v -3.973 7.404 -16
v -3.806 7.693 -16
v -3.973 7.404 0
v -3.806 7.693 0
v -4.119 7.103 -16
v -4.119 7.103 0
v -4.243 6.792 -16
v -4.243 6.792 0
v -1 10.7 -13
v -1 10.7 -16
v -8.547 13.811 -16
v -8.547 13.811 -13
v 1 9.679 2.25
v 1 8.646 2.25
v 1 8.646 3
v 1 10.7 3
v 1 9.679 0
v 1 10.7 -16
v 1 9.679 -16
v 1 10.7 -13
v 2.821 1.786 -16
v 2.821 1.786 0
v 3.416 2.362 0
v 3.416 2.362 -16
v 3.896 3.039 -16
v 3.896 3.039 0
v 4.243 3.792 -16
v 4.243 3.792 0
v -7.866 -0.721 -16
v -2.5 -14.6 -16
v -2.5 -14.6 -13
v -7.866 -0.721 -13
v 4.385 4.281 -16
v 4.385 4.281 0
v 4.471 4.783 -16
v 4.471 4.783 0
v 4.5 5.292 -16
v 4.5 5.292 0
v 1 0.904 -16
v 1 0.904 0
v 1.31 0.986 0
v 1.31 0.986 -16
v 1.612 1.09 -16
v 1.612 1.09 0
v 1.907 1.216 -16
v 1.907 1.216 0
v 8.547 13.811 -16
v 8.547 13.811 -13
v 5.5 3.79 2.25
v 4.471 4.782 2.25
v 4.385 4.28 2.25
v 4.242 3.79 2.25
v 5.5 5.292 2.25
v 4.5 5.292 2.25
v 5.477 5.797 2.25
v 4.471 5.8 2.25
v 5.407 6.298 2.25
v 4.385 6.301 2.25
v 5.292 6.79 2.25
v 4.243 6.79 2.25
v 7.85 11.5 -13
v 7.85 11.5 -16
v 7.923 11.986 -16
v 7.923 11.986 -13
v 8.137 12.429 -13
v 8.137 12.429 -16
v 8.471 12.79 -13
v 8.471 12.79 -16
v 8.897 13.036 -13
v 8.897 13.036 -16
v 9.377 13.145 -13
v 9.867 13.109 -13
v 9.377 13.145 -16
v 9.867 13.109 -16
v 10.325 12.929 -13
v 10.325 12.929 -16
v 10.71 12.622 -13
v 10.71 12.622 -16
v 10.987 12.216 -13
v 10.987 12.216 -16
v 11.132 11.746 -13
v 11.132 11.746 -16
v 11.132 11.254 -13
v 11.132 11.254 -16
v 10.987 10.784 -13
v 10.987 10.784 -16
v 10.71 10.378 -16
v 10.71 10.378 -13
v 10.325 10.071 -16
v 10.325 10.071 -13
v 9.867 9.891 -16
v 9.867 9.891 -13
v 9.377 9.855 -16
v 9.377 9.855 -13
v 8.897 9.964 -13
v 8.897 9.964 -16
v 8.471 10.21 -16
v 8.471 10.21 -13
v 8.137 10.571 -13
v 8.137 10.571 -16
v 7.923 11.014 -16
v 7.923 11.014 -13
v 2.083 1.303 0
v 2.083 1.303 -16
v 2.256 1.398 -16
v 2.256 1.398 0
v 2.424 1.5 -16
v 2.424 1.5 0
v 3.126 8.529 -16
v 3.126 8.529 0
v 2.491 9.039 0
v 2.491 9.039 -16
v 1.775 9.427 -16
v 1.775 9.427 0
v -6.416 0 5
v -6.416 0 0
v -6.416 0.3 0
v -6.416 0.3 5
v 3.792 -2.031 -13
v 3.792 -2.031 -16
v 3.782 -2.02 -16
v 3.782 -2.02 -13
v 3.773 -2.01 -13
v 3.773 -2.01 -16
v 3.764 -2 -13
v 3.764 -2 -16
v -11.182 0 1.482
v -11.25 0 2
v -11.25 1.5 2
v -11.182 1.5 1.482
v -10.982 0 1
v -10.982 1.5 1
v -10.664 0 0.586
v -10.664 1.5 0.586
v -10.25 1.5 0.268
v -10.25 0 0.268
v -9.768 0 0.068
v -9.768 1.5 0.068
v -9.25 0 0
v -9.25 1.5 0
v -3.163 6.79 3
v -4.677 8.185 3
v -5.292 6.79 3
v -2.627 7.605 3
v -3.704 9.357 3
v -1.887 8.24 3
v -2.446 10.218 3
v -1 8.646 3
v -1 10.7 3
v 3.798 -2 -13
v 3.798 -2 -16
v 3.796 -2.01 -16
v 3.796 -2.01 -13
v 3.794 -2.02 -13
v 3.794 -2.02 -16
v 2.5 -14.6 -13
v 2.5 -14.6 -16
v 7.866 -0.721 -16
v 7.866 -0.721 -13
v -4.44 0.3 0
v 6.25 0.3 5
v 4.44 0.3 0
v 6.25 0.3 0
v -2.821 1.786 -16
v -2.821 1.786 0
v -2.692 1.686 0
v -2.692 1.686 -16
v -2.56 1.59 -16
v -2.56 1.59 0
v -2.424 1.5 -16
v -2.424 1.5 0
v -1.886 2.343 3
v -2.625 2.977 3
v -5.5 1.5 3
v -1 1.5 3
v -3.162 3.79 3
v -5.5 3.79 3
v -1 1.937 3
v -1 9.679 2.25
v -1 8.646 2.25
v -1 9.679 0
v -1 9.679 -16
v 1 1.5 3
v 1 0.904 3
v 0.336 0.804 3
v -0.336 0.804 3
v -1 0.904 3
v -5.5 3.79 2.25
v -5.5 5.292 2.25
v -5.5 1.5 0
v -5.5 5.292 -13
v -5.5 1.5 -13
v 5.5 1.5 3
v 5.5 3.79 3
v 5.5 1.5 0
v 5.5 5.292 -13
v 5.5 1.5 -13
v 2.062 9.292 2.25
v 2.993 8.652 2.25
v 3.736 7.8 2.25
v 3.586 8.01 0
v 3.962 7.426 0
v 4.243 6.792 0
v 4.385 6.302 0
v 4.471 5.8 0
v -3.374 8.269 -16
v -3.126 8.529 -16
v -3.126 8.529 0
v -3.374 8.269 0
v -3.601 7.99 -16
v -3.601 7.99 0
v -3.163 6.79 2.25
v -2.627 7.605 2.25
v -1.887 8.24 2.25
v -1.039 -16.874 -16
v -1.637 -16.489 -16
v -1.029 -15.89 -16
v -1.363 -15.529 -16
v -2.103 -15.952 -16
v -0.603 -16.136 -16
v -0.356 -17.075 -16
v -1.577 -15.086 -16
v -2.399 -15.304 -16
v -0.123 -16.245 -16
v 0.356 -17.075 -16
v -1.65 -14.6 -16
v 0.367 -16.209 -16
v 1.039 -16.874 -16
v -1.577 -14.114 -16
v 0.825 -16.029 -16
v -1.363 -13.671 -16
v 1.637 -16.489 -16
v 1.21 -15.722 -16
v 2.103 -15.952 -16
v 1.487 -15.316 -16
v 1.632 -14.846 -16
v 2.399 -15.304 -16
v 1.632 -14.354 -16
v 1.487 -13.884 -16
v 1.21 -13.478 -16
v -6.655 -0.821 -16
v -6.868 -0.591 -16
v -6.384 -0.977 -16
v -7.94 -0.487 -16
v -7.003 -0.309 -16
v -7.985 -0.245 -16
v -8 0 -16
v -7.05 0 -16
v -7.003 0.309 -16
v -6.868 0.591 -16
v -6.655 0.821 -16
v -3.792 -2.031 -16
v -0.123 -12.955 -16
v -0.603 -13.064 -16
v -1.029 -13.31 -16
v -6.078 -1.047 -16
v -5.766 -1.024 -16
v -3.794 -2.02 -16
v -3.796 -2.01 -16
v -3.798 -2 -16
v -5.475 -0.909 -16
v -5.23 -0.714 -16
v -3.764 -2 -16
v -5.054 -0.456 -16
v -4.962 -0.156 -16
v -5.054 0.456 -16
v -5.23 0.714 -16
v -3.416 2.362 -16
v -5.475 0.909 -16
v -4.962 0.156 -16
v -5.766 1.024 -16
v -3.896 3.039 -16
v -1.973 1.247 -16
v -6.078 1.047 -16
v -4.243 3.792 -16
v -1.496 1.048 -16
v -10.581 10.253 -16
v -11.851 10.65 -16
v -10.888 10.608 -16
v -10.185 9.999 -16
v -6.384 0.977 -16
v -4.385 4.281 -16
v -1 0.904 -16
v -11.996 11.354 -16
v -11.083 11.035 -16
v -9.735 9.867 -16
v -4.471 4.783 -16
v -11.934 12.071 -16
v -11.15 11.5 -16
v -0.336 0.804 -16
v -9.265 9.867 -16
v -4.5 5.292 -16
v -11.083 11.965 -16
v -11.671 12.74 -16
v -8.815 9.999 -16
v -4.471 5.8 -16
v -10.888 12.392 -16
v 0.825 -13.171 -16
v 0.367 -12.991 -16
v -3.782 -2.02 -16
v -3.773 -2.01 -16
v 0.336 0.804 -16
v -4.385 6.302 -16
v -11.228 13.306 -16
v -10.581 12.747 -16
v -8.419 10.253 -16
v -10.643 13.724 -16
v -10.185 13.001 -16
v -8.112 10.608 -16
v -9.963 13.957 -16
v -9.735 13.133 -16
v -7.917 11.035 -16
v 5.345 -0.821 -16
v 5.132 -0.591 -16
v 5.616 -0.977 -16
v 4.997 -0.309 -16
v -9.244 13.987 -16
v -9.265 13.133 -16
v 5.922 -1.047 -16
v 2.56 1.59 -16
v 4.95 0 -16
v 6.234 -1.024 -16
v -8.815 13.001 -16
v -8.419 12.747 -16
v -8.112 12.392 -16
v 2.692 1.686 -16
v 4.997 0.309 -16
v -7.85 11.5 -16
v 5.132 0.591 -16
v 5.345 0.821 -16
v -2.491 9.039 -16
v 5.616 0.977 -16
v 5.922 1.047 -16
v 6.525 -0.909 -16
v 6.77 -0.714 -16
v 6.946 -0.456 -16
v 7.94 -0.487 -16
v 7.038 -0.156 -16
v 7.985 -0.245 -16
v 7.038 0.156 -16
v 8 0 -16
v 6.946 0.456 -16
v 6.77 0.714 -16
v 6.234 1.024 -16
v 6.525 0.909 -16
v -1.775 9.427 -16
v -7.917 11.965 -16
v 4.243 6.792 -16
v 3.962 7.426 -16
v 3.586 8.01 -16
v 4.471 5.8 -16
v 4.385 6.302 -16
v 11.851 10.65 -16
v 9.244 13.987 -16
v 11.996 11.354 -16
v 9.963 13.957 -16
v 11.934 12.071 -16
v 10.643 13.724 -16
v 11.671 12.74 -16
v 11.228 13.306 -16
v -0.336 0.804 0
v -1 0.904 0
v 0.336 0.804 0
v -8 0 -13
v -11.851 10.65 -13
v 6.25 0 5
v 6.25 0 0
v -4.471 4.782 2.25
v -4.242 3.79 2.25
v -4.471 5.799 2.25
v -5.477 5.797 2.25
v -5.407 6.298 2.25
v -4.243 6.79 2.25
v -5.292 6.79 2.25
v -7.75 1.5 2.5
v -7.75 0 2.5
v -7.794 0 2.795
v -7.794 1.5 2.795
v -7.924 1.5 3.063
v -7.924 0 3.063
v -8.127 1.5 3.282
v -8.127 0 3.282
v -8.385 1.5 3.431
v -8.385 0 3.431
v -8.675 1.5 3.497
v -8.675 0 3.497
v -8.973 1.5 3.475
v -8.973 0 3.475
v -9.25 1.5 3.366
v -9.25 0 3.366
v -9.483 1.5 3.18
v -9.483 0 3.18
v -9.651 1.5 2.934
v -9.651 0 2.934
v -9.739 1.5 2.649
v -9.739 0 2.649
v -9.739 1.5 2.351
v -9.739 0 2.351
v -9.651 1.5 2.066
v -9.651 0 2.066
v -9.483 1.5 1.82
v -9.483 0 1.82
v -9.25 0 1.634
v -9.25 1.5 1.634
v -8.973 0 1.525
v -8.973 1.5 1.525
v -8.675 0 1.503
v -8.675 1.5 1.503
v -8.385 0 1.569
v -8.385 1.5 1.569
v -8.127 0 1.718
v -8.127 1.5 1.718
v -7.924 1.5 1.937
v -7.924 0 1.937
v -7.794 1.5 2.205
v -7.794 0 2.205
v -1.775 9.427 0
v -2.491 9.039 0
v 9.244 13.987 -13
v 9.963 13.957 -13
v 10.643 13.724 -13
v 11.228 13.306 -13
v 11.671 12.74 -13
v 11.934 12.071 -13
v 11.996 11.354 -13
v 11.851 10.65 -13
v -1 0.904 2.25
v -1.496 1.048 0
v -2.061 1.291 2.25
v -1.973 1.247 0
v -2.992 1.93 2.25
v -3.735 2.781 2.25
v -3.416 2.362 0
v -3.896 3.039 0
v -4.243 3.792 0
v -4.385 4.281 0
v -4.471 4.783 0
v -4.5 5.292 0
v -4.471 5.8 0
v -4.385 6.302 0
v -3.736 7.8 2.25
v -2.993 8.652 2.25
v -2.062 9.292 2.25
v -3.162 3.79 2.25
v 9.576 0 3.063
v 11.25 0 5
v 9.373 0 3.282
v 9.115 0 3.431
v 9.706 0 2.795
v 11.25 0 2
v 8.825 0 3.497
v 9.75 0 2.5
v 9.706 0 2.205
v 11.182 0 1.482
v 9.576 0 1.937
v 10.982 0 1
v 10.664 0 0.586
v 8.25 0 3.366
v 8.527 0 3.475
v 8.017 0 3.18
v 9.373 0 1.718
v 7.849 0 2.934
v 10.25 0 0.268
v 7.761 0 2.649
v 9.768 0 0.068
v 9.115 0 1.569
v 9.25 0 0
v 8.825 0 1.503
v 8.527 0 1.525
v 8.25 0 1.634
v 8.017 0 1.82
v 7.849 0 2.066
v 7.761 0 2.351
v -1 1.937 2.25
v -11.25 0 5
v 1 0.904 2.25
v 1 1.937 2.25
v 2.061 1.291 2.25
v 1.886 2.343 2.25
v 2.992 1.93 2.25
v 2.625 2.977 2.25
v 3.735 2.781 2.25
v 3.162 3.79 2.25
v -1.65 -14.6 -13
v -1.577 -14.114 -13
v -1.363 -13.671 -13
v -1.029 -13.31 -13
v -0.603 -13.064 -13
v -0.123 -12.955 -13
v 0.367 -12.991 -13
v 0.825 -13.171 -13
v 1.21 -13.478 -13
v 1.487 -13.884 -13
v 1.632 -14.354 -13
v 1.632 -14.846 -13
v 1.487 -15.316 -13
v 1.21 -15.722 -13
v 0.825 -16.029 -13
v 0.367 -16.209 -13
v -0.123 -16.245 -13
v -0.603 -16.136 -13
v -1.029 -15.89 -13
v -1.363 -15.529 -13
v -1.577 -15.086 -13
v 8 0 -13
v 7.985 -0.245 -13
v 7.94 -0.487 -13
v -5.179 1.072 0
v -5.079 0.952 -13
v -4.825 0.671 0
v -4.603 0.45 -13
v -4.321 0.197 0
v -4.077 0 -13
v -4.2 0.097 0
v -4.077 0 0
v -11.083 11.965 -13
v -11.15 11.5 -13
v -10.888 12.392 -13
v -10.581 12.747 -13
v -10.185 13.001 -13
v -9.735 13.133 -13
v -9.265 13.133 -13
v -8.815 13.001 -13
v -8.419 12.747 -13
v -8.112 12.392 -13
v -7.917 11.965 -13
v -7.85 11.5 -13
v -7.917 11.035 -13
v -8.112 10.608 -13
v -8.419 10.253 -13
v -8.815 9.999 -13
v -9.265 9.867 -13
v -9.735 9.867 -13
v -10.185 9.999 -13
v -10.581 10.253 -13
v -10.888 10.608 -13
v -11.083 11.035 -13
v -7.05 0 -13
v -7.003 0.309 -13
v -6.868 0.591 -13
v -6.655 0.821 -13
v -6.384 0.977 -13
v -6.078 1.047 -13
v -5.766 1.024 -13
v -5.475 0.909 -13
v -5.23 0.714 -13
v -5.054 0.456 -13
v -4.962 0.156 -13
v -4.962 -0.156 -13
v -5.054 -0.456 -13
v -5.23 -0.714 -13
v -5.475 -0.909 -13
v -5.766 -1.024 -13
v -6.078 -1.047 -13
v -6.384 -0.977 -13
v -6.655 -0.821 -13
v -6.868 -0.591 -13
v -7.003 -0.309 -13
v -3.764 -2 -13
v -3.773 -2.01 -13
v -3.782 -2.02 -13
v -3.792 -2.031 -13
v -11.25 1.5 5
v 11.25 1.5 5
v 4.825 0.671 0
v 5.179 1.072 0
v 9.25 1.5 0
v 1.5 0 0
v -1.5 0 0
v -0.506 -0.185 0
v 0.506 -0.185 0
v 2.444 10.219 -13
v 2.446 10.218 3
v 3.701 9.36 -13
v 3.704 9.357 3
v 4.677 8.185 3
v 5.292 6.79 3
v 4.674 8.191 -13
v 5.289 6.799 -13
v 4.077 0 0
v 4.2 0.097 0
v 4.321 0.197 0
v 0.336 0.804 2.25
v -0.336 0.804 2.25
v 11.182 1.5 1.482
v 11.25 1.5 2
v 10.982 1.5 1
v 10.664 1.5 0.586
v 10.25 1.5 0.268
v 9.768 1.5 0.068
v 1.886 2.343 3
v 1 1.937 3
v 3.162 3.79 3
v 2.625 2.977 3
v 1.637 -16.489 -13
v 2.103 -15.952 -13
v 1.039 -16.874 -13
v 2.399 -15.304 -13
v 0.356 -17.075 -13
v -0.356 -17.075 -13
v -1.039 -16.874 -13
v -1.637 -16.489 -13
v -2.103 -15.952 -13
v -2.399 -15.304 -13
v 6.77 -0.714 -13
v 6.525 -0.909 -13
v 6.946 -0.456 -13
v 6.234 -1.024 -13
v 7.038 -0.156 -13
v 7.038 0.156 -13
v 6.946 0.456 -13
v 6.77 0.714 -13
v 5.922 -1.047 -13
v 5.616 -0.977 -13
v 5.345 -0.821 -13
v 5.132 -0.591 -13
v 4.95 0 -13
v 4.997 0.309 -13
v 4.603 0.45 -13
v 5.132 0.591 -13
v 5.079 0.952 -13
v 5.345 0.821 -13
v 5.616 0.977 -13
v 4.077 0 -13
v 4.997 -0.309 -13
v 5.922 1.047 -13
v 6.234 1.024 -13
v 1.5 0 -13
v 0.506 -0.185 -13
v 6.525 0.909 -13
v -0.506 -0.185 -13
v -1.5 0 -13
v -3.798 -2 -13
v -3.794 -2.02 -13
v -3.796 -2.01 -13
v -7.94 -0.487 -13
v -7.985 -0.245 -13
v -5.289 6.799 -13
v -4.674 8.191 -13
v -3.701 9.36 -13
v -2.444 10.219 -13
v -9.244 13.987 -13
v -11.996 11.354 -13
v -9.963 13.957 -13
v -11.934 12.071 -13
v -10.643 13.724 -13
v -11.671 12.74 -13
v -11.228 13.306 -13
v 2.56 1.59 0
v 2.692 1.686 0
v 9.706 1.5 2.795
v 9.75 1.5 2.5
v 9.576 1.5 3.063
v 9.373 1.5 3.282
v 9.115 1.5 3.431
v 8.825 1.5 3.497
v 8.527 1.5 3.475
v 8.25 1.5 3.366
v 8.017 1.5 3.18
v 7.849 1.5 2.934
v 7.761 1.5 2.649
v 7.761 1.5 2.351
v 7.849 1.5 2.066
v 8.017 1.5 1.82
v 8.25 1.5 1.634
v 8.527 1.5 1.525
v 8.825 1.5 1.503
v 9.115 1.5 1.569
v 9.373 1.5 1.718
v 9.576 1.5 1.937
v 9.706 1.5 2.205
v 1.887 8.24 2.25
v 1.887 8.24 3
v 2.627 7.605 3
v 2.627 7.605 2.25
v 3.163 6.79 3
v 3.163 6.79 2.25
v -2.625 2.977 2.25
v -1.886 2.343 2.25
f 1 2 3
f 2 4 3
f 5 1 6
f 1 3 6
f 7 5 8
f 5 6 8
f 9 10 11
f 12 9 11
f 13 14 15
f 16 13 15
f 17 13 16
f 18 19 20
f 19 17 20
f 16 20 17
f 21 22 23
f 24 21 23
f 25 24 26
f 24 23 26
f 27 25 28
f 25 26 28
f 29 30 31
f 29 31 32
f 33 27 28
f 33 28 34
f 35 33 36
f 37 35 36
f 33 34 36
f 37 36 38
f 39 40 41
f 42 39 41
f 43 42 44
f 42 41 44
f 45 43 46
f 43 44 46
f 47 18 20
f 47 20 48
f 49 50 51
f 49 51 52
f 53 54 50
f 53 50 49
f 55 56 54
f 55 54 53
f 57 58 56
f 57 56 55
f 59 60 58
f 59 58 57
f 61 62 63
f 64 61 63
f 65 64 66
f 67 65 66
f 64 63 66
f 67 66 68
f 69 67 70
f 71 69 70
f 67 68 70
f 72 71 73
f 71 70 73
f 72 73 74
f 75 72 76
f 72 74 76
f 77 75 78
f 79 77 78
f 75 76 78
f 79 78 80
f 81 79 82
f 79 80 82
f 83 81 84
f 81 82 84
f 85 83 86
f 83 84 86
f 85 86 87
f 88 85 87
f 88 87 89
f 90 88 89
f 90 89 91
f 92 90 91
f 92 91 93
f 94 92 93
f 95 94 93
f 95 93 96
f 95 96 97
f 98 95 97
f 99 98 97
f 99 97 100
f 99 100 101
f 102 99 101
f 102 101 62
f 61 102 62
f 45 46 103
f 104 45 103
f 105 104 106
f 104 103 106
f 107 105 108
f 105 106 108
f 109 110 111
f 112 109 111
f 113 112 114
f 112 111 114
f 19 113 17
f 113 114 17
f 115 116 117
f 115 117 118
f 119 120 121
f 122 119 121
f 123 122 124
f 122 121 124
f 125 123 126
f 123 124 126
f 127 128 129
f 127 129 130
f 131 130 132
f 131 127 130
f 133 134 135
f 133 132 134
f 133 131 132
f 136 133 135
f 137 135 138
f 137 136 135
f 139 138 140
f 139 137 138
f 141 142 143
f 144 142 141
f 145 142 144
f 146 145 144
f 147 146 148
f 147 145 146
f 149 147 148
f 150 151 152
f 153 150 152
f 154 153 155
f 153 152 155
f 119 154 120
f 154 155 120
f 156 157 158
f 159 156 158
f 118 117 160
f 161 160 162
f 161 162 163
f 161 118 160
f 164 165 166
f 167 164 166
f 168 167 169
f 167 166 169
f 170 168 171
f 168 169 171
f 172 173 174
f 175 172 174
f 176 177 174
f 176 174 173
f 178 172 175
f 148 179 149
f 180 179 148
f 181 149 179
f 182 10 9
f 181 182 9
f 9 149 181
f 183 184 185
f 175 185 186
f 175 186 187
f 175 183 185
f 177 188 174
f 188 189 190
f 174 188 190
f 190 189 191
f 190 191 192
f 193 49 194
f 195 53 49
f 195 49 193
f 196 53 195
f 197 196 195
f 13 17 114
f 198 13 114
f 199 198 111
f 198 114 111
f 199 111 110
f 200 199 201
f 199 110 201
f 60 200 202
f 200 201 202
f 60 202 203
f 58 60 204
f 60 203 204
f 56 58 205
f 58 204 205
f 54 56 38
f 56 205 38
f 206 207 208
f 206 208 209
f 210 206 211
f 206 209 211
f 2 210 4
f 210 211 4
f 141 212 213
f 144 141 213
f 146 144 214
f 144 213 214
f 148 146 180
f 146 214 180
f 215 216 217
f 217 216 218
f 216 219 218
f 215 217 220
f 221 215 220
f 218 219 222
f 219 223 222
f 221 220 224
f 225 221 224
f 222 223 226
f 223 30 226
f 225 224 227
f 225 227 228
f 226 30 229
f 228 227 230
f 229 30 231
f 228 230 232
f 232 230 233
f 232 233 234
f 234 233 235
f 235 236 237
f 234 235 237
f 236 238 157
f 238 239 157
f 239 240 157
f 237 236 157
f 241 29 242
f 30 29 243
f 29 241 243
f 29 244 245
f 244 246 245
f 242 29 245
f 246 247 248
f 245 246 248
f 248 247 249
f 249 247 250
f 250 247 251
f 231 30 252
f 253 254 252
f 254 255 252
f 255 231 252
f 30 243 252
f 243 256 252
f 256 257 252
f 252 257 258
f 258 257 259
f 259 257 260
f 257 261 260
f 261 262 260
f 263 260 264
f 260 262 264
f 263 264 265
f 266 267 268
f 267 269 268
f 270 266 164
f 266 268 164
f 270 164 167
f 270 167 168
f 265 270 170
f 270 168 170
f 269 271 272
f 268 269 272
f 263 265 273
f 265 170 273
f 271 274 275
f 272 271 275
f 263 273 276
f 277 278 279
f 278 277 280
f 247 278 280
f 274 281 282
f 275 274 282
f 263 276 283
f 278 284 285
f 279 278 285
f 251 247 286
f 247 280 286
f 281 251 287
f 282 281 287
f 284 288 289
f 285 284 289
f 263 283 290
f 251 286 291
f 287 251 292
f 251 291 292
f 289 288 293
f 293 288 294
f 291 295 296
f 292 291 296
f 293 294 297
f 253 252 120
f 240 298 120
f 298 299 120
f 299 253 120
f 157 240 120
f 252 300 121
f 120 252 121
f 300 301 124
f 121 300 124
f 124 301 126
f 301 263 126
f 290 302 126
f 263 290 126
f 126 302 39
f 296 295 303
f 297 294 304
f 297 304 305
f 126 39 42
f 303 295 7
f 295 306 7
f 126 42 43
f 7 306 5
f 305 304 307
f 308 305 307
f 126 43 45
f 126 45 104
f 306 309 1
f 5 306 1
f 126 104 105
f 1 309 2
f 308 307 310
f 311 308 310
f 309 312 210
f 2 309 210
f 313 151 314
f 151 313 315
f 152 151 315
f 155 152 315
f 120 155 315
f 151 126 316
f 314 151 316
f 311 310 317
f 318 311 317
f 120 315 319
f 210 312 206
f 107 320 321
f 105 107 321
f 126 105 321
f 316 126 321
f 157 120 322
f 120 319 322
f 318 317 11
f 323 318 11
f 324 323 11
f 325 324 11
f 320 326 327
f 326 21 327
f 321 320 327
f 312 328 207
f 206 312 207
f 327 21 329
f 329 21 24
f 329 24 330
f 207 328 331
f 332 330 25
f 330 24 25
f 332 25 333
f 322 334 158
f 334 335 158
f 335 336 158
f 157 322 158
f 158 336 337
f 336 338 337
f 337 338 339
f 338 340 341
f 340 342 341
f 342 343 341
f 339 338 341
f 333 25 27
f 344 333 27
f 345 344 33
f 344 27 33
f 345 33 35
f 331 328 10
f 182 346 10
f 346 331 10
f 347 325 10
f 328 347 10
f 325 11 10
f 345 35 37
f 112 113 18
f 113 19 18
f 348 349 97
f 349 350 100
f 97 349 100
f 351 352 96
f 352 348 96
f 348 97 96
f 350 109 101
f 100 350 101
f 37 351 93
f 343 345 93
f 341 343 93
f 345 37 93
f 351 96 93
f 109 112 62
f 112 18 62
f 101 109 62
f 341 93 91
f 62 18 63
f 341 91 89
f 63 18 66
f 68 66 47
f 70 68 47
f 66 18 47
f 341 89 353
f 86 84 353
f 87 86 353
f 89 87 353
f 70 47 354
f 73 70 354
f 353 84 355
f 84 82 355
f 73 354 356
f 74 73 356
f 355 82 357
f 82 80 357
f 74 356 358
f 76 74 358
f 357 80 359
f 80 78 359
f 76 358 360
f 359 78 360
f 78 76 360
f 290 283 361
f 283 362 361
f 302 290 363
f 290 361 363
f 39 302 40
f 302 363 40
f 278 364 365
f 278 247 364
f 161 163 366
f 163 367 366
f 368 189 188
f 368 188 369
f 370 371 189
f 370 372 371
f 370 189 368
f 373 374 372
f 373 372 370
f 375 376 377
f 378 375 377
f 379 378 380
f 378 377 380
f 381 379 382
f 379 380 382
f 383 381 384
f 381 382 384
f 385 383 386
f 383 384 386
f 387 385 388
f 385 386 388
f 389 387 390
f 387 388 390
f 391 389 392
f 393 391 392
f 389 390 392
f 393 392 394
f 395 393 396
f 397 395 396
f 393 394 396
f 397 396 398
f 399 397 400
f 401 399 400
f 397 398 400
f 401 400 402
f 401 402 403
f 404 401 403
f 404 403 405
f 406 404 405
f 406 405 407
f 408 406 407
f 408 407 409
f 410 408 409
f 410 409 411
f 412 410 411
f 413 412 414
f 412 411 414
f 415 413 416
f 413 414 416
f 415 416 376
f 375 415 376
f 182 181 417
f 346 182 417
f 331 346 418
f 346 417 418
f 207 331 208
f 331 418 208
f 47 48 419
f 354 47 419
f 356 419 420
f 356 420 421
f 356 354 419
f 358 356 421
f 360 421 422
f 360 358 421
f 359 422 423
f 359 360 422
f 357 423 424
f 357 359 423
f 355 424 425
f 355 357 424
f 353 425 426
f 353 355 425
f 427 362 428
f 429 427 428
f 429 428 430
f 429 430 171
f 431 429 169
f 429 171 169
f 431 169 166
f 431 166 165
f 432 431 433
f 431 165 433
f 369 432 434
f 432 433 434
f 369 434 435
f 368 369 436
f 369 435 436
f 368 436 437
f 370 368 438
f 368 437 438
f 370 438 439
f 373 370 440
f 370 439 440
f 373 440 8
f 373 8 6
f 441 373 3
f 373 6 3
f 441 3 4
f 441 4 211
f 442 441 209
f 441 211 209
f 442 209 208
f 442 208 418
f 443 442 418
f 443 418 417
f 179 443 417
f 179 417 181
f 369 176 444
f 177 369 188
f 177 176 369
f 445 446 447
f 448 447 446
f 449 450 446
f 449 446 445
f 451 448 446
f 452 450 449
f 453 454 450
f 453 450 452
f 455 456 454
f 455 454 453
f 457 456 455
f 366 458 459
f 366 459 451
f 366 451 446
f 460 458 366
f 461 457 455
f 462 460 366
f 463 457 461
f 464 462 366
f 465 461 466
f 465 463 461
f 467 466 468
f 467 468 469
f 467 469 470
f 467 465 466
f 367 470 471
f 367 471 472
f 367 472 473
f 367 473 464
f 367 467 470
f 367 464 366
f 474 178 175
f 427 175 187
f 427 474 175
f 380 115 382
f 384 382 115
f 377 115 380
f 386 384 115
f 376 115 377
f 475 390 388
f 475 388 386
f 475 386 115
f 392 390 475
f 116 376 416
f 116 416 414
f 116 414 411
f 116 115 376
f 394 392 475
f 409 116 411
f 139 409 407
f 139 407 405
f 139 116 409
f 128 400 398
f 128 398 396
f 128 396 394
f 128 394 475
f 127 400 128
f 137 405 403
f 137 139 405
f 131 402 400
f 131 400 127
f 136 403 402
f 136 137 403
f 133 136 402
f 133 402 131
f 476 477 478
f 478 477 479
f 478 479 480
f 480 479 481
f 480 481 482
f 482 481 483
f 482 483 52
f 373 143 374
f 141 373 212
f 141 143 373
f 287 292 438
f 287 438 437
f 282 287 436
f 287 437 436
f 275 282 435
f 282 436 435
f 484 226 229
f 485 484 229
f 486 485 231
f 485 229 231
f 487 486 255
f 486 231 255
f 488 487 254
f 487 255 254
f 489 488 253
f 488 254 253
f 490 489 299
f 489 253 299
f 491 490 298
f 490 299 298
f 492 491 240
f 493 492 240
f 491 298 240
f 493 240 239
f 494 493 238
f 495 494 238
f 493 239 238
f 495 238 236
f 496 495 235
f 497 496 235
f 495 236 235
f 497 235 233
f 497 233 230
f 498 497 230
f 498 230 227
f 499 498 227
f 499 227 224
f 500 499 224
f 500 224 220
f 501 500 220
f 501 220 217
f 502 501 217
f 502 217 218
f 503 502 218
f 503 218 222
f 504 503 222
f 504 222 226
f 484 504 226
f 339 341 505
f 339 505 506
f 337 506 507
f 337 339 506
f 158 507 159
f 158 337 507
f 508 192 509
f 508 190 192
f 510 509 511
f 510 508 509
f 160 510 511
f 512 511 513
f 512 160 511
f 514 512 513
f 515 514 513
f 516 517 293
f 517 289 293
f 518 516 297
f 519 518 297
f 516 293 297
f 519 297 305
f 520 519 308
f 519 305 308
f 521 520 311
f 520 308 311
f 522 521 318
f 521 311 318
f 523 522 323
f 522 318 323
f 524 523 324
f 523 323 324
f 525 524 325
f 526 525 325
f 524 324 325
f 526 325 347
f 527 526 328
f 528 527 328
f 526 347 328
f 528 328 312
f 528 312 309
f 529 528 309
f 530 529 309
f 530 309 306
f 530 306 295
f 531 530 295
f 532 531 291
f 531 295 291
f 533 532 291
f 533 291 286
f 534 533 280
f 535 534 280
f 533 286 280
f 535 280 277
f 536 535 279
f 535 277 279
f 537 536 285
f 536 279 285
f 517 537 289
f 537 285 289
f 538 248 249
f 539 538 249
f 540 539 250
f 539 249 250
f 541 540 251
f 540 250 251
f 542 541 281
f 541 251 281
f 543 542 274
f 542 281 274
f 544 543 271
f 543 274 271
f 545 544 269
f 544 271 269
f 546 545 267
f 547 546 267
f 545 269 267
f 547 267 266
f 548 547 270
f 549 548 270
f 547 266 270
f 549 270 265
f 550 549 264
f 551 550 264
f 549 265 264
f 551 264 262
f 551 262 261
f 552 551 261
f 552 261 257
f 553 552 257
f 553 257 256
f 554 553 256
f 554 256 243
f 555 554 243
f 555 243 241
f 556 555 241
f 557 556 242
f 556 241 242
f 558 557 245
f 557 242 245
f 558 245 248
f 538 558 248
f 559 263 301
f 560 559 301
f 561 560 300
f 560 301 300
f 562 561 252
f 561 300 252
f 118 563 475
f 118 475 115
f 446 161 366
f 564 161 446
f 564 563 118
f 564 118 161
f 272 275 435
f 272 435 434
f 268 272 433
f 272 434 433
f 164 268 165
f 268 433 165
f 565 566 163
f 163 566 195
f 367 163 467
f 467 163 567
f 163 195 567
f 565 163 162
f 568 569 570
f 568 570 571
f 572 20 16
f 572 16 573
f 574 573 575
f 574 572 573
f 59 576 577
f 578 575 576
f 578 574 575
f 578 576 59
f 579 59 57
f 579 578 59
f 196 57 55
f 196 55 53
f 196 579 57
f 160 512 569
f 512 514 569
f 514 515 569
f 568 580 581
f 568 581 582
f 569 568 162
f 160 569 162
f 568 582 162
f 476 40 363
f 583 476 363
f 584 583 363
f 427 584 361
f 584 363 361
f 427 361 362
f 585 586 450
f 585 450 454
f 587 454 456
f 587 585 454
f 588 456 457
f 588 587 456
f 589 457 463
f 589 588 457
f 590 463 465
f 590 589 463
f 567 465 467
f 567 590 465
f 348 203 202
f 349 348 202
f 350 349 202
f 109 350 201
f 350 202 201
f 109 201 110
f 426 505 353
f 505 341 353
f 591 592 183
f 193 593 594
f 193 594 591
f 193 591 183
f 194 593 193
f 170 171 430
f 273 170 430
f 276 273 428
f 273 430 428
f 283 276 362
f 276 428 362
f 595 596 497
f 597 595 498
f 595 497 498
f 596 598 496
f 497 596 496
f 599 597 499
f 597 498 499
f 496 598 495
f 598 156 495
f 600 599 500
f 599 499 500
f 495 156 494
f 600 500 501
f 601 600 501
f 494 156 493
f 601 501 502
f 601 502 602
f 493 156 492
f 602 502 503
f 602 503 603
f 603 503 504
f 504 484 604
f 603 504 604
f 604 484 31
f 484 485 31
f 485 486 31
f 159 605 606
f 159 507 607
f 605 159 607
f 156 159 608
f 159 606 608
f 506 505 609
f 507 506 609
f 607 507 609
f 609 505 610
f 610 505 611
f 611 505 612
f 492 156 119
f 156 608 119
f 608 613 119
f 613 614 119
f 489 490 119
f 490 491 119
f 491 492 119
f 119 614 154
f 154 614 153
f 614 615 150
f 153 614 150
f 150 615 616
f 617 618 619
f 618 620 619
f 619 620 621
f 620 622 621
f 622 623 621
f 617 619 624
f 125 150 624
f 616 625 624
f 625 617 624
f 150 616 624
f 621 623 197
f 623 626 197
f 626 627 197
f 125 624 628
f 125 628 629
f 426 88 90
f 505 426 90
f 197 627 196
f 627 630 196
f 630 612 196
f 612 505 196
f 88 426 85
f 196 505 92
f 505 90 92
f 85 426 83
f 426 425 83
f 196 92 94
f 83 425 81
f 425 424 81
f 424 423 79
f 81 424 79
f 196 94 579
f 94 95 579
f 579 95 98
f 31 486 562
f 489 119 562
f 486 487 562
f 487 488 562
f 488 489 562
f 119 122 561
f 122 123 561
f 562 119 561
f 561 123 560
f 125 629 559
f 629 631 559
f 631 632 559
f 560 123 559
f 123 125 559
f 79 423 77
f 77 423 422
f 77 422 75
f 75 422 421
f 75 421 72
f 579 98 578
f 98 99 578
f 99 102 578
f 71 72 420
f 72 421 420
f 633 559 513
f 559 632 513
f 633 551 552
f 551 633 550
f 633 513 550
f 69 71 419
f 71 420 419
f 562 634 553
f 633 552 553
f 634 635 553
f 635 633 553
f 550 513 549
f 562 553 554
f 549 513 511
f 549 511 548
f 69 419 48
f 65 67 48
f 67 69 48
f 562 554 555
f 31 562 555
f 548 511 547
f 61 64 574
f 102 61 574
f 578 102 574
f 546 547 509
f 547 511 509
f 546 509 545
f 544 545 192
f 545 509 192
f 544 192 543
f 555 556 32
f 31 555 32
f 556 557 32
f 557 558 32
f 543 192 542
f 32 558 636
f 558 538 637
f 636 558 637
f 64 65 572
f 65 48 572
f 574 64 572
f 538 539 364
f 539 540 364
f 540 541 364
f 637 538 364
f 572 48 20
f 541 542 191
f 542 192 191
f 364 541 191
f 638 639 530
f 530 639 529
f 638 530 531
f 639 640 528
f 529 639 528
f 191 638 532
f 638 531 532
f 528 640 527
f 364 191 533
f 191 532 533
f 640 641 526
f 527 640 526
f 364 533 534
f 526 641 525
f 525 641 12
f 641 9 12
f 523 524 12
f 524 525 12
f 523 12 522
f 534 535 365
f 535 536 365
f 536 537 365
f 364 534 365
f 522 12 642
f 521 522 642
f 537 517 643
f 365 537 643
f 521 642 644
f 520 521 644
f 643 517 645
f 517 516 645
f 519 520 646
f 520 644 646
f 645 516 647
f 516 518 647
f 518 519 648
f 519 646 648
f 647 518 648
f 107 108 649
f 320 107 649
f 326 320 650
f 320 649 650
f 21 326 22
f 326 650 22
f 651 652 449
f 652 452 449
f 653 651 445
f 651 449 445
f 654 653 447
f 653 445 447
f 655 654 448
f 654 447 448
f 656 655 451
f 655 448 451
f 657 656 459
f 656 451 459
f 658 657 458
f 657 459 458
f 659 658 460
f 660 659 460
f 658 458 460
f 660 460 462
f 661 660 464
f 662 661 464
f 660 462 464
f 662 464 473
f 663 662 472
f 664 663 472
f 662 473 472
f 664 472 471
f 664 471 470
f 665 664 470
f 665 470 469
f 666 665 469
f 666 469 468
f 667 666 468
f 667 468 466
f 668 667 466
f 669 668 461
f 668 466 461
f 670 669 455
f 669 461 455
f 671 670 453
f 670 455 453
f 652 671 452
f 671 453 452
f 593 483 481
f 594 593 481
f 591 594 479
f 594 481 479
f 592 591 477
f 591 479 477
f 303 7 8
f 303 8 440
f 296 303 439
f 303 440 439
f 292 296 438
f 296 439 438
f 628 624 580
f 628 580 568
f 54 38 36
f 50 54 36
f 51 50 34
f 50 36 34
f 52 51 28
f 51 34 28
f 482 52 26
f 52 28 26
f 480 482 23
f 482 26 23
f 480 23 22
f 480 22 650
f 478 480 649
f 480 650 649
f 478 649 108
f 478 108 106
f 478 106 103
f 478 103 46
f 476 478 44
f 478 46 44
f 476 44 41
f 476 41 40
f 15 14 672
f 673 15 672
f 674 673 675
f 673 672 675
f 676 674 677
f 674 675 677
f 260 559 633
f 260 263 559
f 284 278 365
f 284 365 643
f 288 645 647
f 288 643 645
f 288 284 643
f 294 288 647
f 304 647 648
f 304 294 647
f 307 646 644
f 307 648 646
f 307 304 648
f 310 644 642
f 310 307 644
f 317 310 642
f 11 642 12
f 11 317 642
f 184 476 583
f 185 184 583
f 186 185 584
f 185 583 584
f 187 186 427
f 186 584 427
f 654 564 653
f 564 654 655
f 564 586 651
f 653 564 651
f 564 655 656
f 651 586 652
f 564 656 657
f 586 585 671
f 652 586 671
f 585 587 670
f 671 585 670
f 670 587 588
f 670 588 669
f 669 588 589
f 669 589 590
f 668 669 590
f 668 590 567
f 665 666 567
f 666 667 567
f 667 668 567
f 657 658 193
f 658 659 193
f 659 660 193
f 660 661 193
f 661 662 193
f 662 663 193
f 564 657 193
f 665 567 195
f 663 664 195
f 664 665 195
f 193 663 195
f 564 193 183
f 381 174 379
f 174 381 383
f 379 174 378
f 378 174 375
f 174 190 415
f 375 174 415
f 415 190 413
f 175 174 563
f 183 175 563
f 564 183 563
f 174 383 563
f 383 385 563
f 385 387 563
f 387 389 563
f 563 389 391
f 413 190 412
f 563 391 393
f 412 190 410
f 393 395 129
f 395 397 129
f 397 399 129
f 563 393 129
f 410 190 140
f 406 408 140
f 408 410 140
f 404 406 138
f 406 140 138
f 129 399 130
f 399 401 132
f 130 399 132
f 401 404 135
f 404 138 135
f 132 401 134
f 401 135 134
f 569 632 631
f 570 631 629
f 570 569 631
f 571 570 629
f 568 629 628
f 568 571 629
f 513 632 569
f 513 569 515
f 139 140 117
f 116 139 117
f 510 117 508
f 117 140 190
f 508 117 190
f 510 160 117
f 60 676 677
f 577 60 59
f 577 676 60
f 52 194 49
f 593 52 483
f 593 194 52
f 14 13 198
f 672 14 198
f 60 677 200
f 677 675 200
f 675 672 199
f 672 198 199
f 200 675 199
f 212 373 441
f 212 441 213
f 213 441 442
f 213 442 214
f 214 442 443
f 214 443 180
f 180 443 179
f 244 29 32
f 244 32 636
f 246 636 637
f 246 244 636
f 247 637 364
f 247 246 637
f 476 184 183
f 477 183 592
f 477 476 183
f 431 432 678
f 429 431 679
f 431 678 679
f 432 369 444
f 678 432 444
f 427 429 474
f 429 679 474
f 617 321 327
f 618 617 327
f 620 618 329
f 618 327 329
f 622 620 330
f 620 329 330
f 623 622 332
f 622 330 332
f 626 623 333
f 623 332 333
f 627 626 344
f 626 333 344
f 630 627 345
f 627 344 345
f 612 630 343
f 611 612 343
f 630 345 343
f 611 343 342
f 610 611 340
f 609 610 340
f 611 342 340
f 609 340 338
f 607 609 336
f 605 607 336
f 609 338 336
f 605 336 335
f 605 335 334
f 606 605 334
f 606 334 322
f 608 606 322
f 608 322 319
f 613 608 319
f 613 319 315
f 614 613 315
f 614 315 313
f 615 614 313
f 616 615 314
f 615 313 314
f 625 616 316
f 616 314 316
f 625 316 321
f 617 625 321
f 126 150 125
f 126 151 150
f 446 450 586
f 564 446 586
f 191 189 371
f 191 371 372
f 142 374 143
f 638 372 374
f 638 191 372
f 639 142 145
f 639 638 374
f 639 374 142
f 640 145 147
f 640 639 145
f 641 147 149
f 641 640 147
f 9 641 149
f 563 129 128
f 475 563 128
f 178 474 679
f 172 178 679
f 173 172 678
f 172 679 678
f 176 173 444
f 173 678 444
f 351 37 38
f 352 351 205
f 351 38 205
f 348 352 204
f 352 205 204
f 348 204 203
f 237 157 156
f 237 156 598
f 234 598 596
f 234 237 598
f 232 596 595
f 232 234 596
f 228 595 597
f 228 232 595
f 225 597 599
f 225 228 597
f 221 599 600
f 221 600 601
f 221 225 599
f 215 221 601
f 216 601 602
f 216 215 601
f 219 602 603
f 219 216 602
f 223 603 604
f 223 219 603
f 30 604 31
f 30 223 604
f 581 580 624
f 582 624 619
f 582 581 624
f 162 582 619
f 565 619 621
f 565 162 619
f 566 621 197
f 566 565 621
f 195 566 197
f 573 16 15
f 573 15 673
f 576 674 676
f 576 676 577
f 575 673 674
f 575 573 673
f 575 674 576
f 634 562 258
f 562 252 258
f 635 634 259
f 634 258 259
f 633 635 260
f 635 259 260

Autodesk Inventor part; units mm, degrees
ref_plane "YZ Plane" through (0, 0, 0) normal (1, 0, 0) x (0, 1, 0)
ref_plane "XZ Plane" through (0, 0, 0) normal (0, 1, 0) x (-1, 0, 0)
ref_plane "XY Plane" through (0, 0, 0) normal (0, 0, 1) x (1, 0, 0)
sketch "スケッチ1" plane through (0, 0, 0) normal (0, 0, 1) x (1, 0, 0)
  circle A0 centre (0, 0) radius 16
  line L0 (0, 0) -> (-6, 0)
  line L1 (-6, 0) -> (6, 0)
  circle A1 centre (-6, 0) radius 9
  circle A2 centre (-6, 0) radius 3
  circle A3 centre (6, 0) radius 9
  circle A4 centre (6, 0) radius 3
  circle A5 centre (-6, 0) radius 8
  circle A6 centre (0, 5.2915) radius 5
  circle A7 centre (0, 5.2915) radius 4.5
  circle A8 centre (0, 5.2915) radius 5.5
  circle A9 centre (0, 5.2915) radius 3.5
  line L2 (0, 0) -> (-11.25, 0)
  line L3 (-11.25, 0) -> (11.25, 0)
  line L4 (-11.25, 0) -> (11.25, 0)
  line L5 (11.25, 0) -> (11.25, 1.5)
  line L6 (11.25, 1.5) -> (-11.25, 1.5)
  line L7 (-11.25, 1.5) -> (-11.25, 0)
  line L8 (0, 5.2915) -> (-5.5, 5.2915)
  line L9 (0, 5.2915) -> (5.5, 5.2915)
  line L10 (5.5, 3.7915) -> (-5.5, 3.7915)
  line L11 (-5.5, 3.7915) -> (-5.5, 6.7915)
  line L12 (-5.5, 6.7915) -> (5.5, 6.7915)
  line L13 (5.5, 6.7915) -> (5.5, 3.7915)
  line L14 (5.5, 3.7915) -> (-5.5, 6.7915) construction
  line L15 (-5.5, 3.7915) -> (5.5, 6.7915) construction
  line L16 (-5.5, 5.2915) -> (-5.5, 1.5)
  line L17 (5.5, 5.2915) -> (5.5, 1.5)
  line L18 (5.2915, 3.7915) -> (5.2915, 1.5)
  line L19 (-5.2915, 3.7915) -> (-5.2915, 1.5)
  circle A10 centre (0, 5.2915) radius 6.6802
  point P0 (-3.9843, 1.5)
  point P1 (3.9843, 1.5)
  point P2 (4.0774, 0)
  point P3 (1.5, 0)
  point P4 (-4.0774, 0)
  point P5 (-1.5, 0)
  dimension "d0" = 32
  dimension "d1" = 6
  dimension "d2" = 12
  dimension "d3" = 18
  dimension "d4" = 6
  dimension "d5" = 16
  dimension "d6" = 9
  dimension "d7" = 11
  dimension "d8" = 7
  dimension "d9" = 11.25
  dimension "d10" = 22.5
  dimension "d11" = 1.5
  dimension "d12" = 3
extrude "押し出し1" add sketch "スケッチ1" along normal blind 5 contours L0 A8 A3 A6 A5 L1 | L0 A3 A8 | A8 A5 L1 | L0 A10 L6 A8 A2 | A2 A8 A3 | A8 A2 L6 A6 A3 | A5 A8 A1 L1 | A5 A6 A1 A8 | L0 L2 A2 L6 A10 | A8 L6 A2 | A6 L6 A3 | A3 L6 A7 A5 A6 | A4 A8 L6 A10 L1 | A1 A8 A4 | A5 A7 L6 A1 A6 | A1 A6 L6 A4 A8 | L2 L7 L6 A2 | A10 L6 A4 L3 L1 | A4 L6 A8 | A7 L6 A5 | A5 L6 A7 | A1 L6 A6 | A4 L6 L5 L3 picked at (2.524, 0.7859) picked at (-3.6973, 1.4091) picked at (3.6973, 1.4091)
extrude "押し出し2" add sketch "スケッチ1" along normal blind 3 contours L0 A8 A3 A6 A5 L1 | A8 A2 L6 A6 A3 | A5 A6 A1 A8 | A8 L6 A2 | A6 L6 A3 | A3 L6 A7 A5 A6 | A5 A7 L6 A1 A6 | A1 A6 L6 A4 A8 | L16 A2 L19 L6 | L6 A8 A2 | A2 A6 L6 | L6 L19 A2 A8 | L6 A6 L10 A7 A3 | A3 A7 L6 | A4 L6 A8 | A7 L6 A5 | A5 L6 A7 | A1 L6 A6 | L16 L10 L19 A2 | A2 A8 L10 A6 | A2 L19 A8 | A7 L10 A9 A3 | A3 A9 A5 L6 A7 | L6 L18 A4 L17 | L6 A6 A4 | A4 A8 L6 | A8 A4 L18 L6 | A5 A9 A1 A7 L6 | A7 A1 L6 | A1 A7 L10 A6 L6 | L11 A8 L10 | L10 A8 L8 A6 | A6 L8 A7 L10 | A8 A1 A6 A5 | A5 A6 L12 A8 | A7 L8 A9 L10 | A4 L18 L10 L17 | A6 L10 A8 A4 | A8 L18 A4 | A1 A9 L10 A7 | A8 L12 A6 L8 | A6 L12 A7 L8 | A8 A3 A6 A1 | A6 A1 A7 A5 | A5 A7 L12 A6 | A7 L12 A9 L8 | L10 A8 L13 | L10 A7 L9 A6 | A6 L9 A8 L10 | L10 A9 L9 A7 | A6 A3 A7 A1 | A8 L12 A6 A3 | A7 A1 A9 A5 | A5 A9 L12 A7 | L9 A6 L12 A8 | L9 A7 L12 A6 | L9 A9 L12 A7 | A7 A3 A9 A1 | A6 L12 A7 A3 | L12 A9 A3 A7
extrude "押し出し3" cut sketch "スケッチ1" along normal blind 2.25 contours A7 L6 A5 | A5 L6 A7 | A7 L10 A9 A3 | A3 A9 A5 L6 A7 | A5 A9 A1 A7 L6 | A7 L8 A9 L10 | A1 A9 L10 A7 | A7 L12 A9 L8 | L10 A9 L9 A7 | A7 A1 A9 A5 | A5 A9 L12 A7 | L9 A9 L12 A7 | A7 A3 A9 A1 | L12 A9 A3 A7
sketch "スケッチ2" plane through (0, 0, 3) normal (0, 0, 1) x (1, 0, 0)
  line L0 (5.5, 3.7903) -> (-5.5, 3.7903)
  line L1 (-5.5, 3.7903) -> (-5.5, 6.7903)
  line L2 (-5.5, 6.7903) -> (5.5, 6.7903)
  line L3 (5.5, 6.7903) -> (5.5, 3.7903)
  line L4 (5.5, 3.7903) -> (-5.5, 6.7903) construction
  line L5 (-5.5, 3.7903) -> (5.5, 6.7903) construction
  point P0 (0, 0)
  point P1 (0, 5.2903)
  dimension "d19" = 11
  dimension "d20" = 3
extrude "押し出し4" cut sketch "スケッチ2" against normal blind 0.75
extrude "押し出し5" add sketch "スケッチ1" against normal blind 16 contours L1 A8 L0 | L0 A8 A3 A6 A5 L1 | L0 A3 A8 | A8 A5 L1 | L0 A10 L6 A8 A2 | A2 A8 A3 | A8 A2 L6 A6 A3 | A5 A8 A1 L1 | A5 A6 A1 A8 | A8 L6 A2 | A6 L6 A3 | A3 L6 A7 A5 A6 | A4 A8 L6 A10 L1 | A1 A8 A4 | A5 A7 L6 A1 A6 | A1 A6 L6 A4 A8 | L16 A2 L19 L6 | L6 A8 A2 | A2 A6 L6 | L6 L19 A2 A8 | L6 A6 L10 A7 A3 | A3 A7 L6 | A4 L6 A8 | A1 L6 A6 | L16 L10 L19 A2 | A2 A8 L10 A6 | A2 L19 A8 | L6 L18 A4 L17 | L6 A6 A4 | A4 A8 L6 | A8 A4 L18 L6 | A7 A1 L6 | A1 A7 L10 A6 L6 | L11 A8 L10 | L10 A8 L8 A6 | A6 L8 A7 L10 | A8 A1 A6 A5 | A5 A6 L12 A8 | A4 L18 L10 L17 | A6 L10 A8 A4 | A8 L18 A4 | A8 L12 A6 L8 | A6 L12 A7 L8 | A8 A3 A6 A1 | A6 A1 A7 A5 | A5 A7 L12 A6 | L10 A8 L13 | L10 A7 L9 A6 | A6 L9 A8 L10 | A6 A3 A7 A1 | A8 L12 A6 A3 | L9 A6 L12 A8 | L9 A7 L12 A6 | A6 L12 A7 A3
sketch "電池" plane through (0, 0, -16) normal (0, 0, -1) x (-1, 0, 0)
  line L0 (0, 0) -> (0, 8)
  circle A0 centre (0, 8) radius 8
  dimension "d34" = 8
sketch "スケッチ3" plane through (0, 5.2915, -16) normal (0, 0, -1) x (-1, 0, 0)
  line L0 (0, -5.2915) -> (-6, -5.2915)
  line L1 (11.25, -5.2915) -> (-11.25, -5.2915) projected
  line L2 (-6, -5.2915) -> (6, -5.2915)
  circle A0 centre (-6, -5.2915) radius 3
  circle A1 centre (-6, -5.2915) radius 9
  circle A2 centre (6, -5.2915) radius 3
  circle A3 centre (6, -5.2915) radius 9
  circle A4 centre (-6, -5.2915) radius 10
  circle A5 centre (6, -5.2915) radius 10
  line L3 (0, -5.2915) -> (11, -5.2915)
  line L4 (0, -5.2915) -> (0, 6.2085)
  line L5 (0, 6.2085) -> (9.5, 6.2085)
  line L6 (9.5, 6.2085) -> (-9.5, 6.2085)
  circle A6 centre (-9.5, 6.2085) radius 1.65
  circle A7 centre (9.5, 6.2085) radius 1.65
  circle A8 centre (-9.5, 6.2085) radius 2.5
  circle A9 centre (9.5, 6.2085) radius 2.5
  circle A10 centre (6, -5.2915) radius 1.05
  circle A11 centre (-6, -5.2915) radius 1.05
  line L7 (0, -5.2915) -> (0, -6.5915)
  line L8 (-5.5, -3.7915) -> (-5.5, -1.5012) projected
  line L9 (0, -6.5915) -> (11.25, -6.5915)
  line L10 (11.25, -6.5915) -> (11.25, -5.2915)
  line L11 (0, -6.5915) -> (-11.25, -6.5915)
  line L12 (-11.25, -6.5915) -> (-11.25, -5.2915)
  line L13 (0, -6.5915) -> (0, -14.5915)
  line L14 (0, -14.5915) -> (11.25, -14.5915)
  line L15 (11.25, -14.5915) -> (11.25, -15.8915)
  line L16 (11.25, -15.8915) -> (-11.25, -15.8915)
  line L17 (-11.25, -15.8915) -> (-11.25, -14.5915)
  line L18 (0, -14.5915) -> (-11.25, -14.5915)
  line L19 (0, -15.8915) -> (0, -19.8915)
  circle A12 centre (0, -19.8915) radius 1.65
  circle A13 centre (0, -19.8915) radius 2.5
  line L20 (-2.5, -19.8915) -> (2.5, -19.8915)
  circle A14 centre (0, 0) radius 5.5
  circle A15 centre (-6, -5.2915) radius 2
  circle A16 centre (6, -5.2915) radius 2
  line L21 (-9.5, 3.7085) -> (9.5, 3.7085)
  line L22 (-8, -5.2915) -> (-8, 3.7085)
  line L23 (8, -5.2915) -> (8, 3.7085)
  line L24 (-6, -7.2915) -> (6, -7.2915)
  line L25 (2.5, -19.8915) -> (2.5, -7.2915)
  line L26 (-2.5, -19.8915) -> (-2.5, -7.2915)
  line L27 (1, -5.5) -> (-1, -5.5)
  line L28 (-1, -5.5) -> (-1, 5.5)
  line L29 (-1, 5.5) -> (1, 5.5)
  line L30 (1, 5.5) -> (1, -5.5)
  line L31 (1, -5.5) -> (-1, 5.5) construction
  line L32 (-1, -5.5) -> (1, 5.5) construction
  circle A17 centre (0, 0) radius 4.5
  line L33 (-1, 5.4083) -> (-8.5471, 8.5198)
  line L34 (1, 5.4083) -> (8.5471, 8.5198)
  line L35 (-8, -5.2915) -> (-11.851, 5.3584)
  line L36 (8, -5.2915) -> (11.851, 5.3584)
  line L37 (-2.5, -19.8915) -> (-7.8655, -6.0127)
  line L38 (2.5, -19.8915) -> (7.8655, -6.0127)
  point P0 (3.7639, -7.2915)
  point P1 (3.798, -7.2915)
  point P2 (3.7917, -7.3221)
  point P3 (-3.7639, -7.2915)
  point P4 (-3.7917, -7.3221)
  point P5 (-3.798, -7.2915)
  point P6 (3, -5.2915)
  point P7 (1.5, -5.2915)
  point P8 (-1.5, -5.2915)
  point P9 (-4, -5.2915)
  point P10 (-3.8997, -3.8785)
  point P11 (3.0937, -4.5474)
  point P12 (-1, -4.3875)
  point P13 (1, -4.3875)
  point P14 (1, 5.4083)
  dimension "d25" = 6
  dimension "d26" = 12
  dimension "d27" = 6
  dimension "d28" = 18
  dimension "d35" = 20
  dimension "d36" = 20
  dimension "d37" = 11
  dimension "d38" = 11.5
  dimension "d39" = 9.5
  dimension "d40" = 19
  dimension "d41" = 3.3
  dimension "d42" = 3.3
  dimension "d43" = 5
  dimension "d44" = 5
  dimension "d45" = 2.1
  dimension "d46" = 2.1
  dimension "d47" = 1.3
  dimension "d48" = 8
  dimension "d49" = 1.3
  dimension "d50" = 4
  dimension "d51" = 3.3
  dimension "d52" = 5
  dimension "d53" = 11
  dimension "d54" = 4
  dimension "d55" = 4
  dimension "d56" = 2
  dimension "d57" = 11
  dimension "d58" = 9
sketch "スケッチ4" plane through (-11.25, 0, 5) normal (0, -1, 0) x (1, 0, 0)
  line L0 (0, 0) -> (22.5, 0) projected
  line L1 (0, 0) -> (2.5, 0)
  line L2 (2.5, 0) -> (2.5, -2.5)
  line L3 (2.5, -2.5) -> (20, -2.5)
  circle A0 centre (2.5, -2.5) radius 1
  circle A1 centre (20, -2.5) radius 1
  line L4 (0.1664, -5) -> (4.8336, -5)
  line L5 (4.8336, -5) -> (4.8336, 0)
  line L6 (4.8336, 0) -> (0.1664, 0)
  line L7 (0.1664, 0) -> (0.1664, -5)
  line L8 (0.1664, -5) -> (4.8336, 0) construction
  line L9 (4.8336, -5) -> (0.1664, 0) construction
  line L10 (22.5, -5) -> (17.5, -5)
  line L11 (17.5, -5) -> (17.5, 0)
  line L12 (17.5, 0) -> (22.5, 0)
  line L13 (22.5, 0) -> (22.5, -5)
  line L14 (22.5, -5) -> (17.5, 0) construction
  line L15 (17.5, -5) -> (22.5, 0) construction
  line L16 (4.8336, -5) -> (17.5, -5)
  point P0 (11.25, -5)
  dimension "d29" = 2.5
  dimension "d30" = 2.5
  dimension "d31" = 17.5
  dimension "d32" = 2
  dimension "d33" = 2
  dimension "d63" = 5
  dimension "d64" = 5
extrude "押し出し6" add sketch "スケッチ3" against normal blind 3 contours A0 L11 A5 L0 | A3 L11 A0 | L0 A14 L28 L27 L7 L11 A3 | A15 L11 L1 A11 L0 | A15 L8 A0 A14 A5 | L0 A11 L1 A15 | A5 L11 A15 | L11 A3 L24 A0 | A0 L24 A5 L11 | L11 L13 L24 A3 | A5 L24 A15 L11 | A15 L22 A0 L8 | A15 L11 | A14 L27 L28 | L24 A3 L26 A5 A0 | L24 L26 A3 | L7 L27 L30 A14 L1 A1 L9 | L9 A1 L24 L13 | A0 L22 A1 A14 | A5 A0 L37 L11 A15 L24 | L35 A0 L22 | L11 L37 A15 | A14 L30 L27 | A5 L26 A1 L37 A0 | L26 L24 L13 A3 | A3 A1 A5 L26 | L9 A2 L24 A1 | A1 A2 L9 | L24 L25 A1 L13 | A1 L21 A14 | A0 L35 A1 L22 | A5 A1 L26 | L13 A5 A1 | A1 L25 A4 A3 | A3 A4 L13 | L24 A2 A4 L25 A1 | A1 L25 L24 | A2 A14 A4 L1 | L1 A4 L9 A2 | L9 A4 L24 A2 | A1 L22 L21 | L21 A8 A4 A14 | A1 L35 A4 A8 L21 L22 | A1 L26 L18 L37 | A5 A4 L18 L26 A1 | A4 L25 A3 | A3 L25 L14 A5 A4 | L13 L18 A4 | A5 L14 L13 | A16 L1 A10 | A16 L9 A4 | A4 A14 A2 L23 A16 | L1 A10 A16 L9 | L9 A16 L24 A4 | A4 A8 L6 L33 A14 | L35 A8 A4 | L18 L26 A4 L37 | L18 A4 L26 | A4 A2 L38 A3 L25 | A3 L38 L14 L25 | L18 L14 A5 L25 L16 L26 A4 | L14 L25 A5 | A4 L24 A16 L9 L38 A2 | L23 A2 L36 | L9 A16 | A8 A4 | A4 A8 | A4 L26 L16 L37 | L14 L38 A5 L25 | A5 L38 L16 L25 | A14 A3 L23 A2 | L38 L9 A16 | L23 A3 L36 A2 | A8 L33 L6 | L16 L26 L37 | L16 L19 A13 L26 | A14 L21 A3 | L25 A13 L19 L16 | L16 L38 L25 | L23 L21 A9 A5 L36 A3 | A3 L21 L23 | L34 L5 A9 A5 A14 | L20 A12 A13 | A13 L19 A12 L20 | L21 A14 A5 A9 | L20 A12 L19 A13 | A5 A9 L36 | L34 A9 L5 | A9 A5 | A5 A9
extrude "押し出し7" cut sketch "スケッチ3" against normal blind 19 contours L28 A3 L4 A17 | L28 A5 A1 A3 | L4 A1 L30 A17 | L28 A1 A5 | A3 A4 L30 A1 | L4 A4 A3 | A1 A5 L4 | A1 L28 A4 A5 | A4 A5 L30 A3 | A3 L30 A4 | L4 L21 L30 A5 | A4 L28 L21 L4 | L21 L28 A17 L4 | L4 A17 L30 L21 | A14 L4 A17 L28 | L4 A14 L30 A17
extrude "押し出し8" cut sketch "スケッチ4" against normal blind 0.3 contours L0 L11 L3 L5 | L5 L3 L11 L16
extrude "押し出し9" cut sketch "スケッチ4" against normal blind 1.5 contours A0 L3 L2 | L2 L3 A0 | A1
fillet "フィレット1" radius 2 2 edges at (-11.25, 0.75, 0) (11.25, 0.75, 0)
properties part number "ikafly2"
